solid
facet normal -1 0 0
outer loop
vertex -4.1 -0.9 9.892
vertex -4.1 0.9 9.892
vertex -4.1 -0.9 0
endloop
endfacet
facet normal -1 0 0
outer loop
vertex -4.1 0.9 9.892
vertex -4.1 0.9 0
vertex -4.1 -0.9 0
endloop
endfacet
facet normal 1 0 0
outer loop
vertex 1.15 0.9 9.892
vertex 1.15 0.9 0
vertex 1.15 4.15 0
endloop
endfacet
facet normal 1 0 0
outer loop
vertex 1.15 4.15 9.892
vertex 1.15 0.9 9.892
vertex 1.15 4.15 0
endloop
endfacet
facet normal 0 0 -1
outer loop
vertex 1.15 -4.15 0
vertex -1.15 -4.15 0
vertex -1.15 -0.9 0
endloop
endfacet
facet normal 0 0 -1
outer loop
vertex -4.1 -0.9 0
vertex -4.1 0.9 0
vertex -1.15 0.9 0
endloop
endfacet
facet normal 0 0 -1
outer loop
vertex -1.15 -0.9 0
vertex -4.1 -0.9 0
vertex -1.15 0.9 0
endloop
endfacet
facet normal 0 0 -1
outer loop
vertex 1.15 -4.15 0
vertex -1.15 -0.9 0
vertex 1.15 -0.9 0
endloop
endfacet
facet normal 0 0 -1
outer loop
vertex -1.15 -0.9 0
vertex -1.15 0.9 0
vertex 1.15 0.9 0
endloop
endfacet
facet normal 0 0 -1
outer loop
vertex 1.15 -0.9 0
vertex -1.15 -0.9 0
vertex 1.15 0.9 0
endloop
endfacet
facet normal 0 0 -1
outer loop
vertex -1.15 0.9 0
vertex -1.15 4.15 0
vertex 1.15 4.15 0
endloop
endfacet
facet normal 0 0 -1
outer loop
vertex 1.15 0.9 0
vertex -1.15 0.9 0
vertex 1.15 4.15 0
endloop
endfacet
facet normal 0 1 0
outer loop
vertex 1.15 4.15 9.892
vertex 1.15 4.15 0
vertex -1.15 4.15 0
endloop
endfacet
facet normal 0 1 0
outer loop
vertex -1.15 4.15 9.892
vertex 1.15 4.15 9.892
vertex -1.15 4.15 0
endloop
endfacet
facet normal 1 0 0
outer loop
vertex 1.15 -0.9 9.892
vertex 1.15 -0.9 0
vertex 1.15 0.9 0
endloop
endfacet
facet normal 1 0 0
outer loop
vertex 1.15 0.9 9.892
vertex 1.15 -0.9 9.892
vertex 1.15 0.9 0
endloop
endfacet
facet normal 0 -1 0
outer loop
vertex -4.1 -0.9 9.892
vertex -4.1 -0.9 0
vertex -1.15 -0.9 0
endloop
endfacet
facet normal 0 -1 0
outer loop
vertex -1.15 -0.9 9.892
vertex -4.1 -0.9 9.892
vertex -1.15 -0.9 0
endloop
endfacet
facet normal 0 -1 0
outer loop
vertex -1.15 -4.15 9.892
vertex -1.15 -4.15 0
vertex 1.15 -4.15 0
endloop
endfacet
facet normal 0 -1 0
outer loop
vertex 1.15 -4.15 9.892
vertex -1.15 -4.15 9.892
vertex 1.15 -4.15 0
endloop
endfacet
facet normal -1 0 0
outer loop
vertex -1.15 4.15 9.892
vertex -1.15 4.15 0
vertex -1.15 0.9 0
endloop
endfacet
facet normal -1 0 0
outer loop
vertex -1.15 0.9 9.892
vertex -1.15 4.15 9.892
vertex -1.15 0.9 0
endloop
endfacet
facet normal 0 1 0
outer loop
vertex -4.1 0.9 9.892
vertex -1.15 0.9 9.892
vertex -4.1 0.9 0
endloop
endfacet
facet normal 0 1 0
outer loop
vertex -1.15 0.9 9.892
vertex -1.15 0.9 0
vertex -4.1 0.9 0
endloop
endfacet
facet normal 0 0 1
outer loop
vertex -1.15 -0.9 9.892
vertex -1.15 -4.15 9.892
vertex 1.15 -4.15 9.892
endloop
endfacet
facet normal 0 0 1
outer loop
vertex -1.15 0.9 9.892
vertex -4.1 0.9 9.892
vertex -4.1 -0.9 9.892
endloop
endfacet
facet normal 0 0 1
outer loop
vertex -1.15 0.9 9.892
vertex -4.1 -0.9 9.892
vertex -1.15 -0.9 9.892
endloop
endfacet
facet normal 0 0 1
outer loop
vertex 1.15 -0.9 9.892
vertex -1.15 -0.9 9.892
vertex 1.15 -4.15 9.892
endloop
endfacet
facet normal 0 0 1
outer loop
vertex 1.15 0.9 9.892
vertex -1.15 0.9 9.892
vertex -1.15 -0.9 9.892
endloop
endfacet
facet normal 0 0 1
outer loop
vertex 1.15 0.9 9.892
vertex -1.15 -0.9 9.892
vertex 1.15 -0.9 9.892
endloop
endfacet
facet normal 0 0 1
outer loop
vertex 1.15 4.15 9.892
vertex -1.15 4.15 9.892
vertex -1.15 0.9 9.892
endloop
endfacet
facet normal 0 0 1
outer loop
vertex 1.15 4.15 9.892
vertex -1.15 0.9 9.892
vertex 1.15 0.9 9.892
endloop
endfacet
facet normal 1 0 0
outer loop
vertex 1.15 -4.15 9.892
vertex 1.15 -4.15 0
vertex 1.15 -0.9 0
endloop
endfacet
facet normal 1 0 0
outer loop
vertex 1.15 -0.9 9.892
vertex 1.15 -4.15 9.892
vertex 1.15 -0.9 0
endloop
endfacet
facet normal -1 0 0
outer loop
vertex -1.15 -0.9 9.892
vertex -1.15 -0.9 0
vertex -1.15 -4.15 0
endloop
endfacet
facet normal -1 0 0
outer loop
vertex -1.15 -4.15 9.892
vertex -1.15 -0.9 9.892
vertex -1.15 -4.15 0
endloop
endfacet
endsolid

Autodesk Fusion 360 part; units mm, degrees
sketch "Sketch5" plane through (0, 0, 0) normal (0, 0, 1) x (1, 0, 0)
  line L0 (1.15, 4.15) -> (-1.15, 4.15)
  line L1 (-1.15, -4.15) -> (1.15, -4.15)
  line L2 (1.15, -4.15) -> (1.15, 4.15)
  line L3 (1.15, 4.15) -> (-1.15, -4.15) construction
  line L4 (-1.15, 4.15) -> (1.15, -4.15) construction
  line L5 (-4.1, 0.9) -> (-4.1, -0.9)
  line L6 (-4.1, -0.9) -> (-1.15, -0.9)
  line L7 (1.15, -0.9) -> (1.15, 0.9)
  line L8 (-1.15, 0.9) -> (-4.1, 0.9)
  line L9 (-1.15, 4.15) -> (-1.15, 0.9)
  line L10 (-1.15, -0.9) -> (-1.15, -4.15)
  dimension "d16" = 2.3
  dimension "d17" = 8.3
  dimension "d18" = 1.8
  dimension "d20" = 2.95
extrude "Extrude4" add sketch "Sketch5" along normal blind 9.892
equation "d16 = 2.5 mm - 0.2 mm"
equation "d17 = 8.60 mm - 0.3 mm"
equation "d18 = 2 mm - 0.2 mm"
equation "d20 = 3.05 mm - 0.1 mm"
equation "d21 = 8.092 mm - 0.2 mm + 2 mm"
